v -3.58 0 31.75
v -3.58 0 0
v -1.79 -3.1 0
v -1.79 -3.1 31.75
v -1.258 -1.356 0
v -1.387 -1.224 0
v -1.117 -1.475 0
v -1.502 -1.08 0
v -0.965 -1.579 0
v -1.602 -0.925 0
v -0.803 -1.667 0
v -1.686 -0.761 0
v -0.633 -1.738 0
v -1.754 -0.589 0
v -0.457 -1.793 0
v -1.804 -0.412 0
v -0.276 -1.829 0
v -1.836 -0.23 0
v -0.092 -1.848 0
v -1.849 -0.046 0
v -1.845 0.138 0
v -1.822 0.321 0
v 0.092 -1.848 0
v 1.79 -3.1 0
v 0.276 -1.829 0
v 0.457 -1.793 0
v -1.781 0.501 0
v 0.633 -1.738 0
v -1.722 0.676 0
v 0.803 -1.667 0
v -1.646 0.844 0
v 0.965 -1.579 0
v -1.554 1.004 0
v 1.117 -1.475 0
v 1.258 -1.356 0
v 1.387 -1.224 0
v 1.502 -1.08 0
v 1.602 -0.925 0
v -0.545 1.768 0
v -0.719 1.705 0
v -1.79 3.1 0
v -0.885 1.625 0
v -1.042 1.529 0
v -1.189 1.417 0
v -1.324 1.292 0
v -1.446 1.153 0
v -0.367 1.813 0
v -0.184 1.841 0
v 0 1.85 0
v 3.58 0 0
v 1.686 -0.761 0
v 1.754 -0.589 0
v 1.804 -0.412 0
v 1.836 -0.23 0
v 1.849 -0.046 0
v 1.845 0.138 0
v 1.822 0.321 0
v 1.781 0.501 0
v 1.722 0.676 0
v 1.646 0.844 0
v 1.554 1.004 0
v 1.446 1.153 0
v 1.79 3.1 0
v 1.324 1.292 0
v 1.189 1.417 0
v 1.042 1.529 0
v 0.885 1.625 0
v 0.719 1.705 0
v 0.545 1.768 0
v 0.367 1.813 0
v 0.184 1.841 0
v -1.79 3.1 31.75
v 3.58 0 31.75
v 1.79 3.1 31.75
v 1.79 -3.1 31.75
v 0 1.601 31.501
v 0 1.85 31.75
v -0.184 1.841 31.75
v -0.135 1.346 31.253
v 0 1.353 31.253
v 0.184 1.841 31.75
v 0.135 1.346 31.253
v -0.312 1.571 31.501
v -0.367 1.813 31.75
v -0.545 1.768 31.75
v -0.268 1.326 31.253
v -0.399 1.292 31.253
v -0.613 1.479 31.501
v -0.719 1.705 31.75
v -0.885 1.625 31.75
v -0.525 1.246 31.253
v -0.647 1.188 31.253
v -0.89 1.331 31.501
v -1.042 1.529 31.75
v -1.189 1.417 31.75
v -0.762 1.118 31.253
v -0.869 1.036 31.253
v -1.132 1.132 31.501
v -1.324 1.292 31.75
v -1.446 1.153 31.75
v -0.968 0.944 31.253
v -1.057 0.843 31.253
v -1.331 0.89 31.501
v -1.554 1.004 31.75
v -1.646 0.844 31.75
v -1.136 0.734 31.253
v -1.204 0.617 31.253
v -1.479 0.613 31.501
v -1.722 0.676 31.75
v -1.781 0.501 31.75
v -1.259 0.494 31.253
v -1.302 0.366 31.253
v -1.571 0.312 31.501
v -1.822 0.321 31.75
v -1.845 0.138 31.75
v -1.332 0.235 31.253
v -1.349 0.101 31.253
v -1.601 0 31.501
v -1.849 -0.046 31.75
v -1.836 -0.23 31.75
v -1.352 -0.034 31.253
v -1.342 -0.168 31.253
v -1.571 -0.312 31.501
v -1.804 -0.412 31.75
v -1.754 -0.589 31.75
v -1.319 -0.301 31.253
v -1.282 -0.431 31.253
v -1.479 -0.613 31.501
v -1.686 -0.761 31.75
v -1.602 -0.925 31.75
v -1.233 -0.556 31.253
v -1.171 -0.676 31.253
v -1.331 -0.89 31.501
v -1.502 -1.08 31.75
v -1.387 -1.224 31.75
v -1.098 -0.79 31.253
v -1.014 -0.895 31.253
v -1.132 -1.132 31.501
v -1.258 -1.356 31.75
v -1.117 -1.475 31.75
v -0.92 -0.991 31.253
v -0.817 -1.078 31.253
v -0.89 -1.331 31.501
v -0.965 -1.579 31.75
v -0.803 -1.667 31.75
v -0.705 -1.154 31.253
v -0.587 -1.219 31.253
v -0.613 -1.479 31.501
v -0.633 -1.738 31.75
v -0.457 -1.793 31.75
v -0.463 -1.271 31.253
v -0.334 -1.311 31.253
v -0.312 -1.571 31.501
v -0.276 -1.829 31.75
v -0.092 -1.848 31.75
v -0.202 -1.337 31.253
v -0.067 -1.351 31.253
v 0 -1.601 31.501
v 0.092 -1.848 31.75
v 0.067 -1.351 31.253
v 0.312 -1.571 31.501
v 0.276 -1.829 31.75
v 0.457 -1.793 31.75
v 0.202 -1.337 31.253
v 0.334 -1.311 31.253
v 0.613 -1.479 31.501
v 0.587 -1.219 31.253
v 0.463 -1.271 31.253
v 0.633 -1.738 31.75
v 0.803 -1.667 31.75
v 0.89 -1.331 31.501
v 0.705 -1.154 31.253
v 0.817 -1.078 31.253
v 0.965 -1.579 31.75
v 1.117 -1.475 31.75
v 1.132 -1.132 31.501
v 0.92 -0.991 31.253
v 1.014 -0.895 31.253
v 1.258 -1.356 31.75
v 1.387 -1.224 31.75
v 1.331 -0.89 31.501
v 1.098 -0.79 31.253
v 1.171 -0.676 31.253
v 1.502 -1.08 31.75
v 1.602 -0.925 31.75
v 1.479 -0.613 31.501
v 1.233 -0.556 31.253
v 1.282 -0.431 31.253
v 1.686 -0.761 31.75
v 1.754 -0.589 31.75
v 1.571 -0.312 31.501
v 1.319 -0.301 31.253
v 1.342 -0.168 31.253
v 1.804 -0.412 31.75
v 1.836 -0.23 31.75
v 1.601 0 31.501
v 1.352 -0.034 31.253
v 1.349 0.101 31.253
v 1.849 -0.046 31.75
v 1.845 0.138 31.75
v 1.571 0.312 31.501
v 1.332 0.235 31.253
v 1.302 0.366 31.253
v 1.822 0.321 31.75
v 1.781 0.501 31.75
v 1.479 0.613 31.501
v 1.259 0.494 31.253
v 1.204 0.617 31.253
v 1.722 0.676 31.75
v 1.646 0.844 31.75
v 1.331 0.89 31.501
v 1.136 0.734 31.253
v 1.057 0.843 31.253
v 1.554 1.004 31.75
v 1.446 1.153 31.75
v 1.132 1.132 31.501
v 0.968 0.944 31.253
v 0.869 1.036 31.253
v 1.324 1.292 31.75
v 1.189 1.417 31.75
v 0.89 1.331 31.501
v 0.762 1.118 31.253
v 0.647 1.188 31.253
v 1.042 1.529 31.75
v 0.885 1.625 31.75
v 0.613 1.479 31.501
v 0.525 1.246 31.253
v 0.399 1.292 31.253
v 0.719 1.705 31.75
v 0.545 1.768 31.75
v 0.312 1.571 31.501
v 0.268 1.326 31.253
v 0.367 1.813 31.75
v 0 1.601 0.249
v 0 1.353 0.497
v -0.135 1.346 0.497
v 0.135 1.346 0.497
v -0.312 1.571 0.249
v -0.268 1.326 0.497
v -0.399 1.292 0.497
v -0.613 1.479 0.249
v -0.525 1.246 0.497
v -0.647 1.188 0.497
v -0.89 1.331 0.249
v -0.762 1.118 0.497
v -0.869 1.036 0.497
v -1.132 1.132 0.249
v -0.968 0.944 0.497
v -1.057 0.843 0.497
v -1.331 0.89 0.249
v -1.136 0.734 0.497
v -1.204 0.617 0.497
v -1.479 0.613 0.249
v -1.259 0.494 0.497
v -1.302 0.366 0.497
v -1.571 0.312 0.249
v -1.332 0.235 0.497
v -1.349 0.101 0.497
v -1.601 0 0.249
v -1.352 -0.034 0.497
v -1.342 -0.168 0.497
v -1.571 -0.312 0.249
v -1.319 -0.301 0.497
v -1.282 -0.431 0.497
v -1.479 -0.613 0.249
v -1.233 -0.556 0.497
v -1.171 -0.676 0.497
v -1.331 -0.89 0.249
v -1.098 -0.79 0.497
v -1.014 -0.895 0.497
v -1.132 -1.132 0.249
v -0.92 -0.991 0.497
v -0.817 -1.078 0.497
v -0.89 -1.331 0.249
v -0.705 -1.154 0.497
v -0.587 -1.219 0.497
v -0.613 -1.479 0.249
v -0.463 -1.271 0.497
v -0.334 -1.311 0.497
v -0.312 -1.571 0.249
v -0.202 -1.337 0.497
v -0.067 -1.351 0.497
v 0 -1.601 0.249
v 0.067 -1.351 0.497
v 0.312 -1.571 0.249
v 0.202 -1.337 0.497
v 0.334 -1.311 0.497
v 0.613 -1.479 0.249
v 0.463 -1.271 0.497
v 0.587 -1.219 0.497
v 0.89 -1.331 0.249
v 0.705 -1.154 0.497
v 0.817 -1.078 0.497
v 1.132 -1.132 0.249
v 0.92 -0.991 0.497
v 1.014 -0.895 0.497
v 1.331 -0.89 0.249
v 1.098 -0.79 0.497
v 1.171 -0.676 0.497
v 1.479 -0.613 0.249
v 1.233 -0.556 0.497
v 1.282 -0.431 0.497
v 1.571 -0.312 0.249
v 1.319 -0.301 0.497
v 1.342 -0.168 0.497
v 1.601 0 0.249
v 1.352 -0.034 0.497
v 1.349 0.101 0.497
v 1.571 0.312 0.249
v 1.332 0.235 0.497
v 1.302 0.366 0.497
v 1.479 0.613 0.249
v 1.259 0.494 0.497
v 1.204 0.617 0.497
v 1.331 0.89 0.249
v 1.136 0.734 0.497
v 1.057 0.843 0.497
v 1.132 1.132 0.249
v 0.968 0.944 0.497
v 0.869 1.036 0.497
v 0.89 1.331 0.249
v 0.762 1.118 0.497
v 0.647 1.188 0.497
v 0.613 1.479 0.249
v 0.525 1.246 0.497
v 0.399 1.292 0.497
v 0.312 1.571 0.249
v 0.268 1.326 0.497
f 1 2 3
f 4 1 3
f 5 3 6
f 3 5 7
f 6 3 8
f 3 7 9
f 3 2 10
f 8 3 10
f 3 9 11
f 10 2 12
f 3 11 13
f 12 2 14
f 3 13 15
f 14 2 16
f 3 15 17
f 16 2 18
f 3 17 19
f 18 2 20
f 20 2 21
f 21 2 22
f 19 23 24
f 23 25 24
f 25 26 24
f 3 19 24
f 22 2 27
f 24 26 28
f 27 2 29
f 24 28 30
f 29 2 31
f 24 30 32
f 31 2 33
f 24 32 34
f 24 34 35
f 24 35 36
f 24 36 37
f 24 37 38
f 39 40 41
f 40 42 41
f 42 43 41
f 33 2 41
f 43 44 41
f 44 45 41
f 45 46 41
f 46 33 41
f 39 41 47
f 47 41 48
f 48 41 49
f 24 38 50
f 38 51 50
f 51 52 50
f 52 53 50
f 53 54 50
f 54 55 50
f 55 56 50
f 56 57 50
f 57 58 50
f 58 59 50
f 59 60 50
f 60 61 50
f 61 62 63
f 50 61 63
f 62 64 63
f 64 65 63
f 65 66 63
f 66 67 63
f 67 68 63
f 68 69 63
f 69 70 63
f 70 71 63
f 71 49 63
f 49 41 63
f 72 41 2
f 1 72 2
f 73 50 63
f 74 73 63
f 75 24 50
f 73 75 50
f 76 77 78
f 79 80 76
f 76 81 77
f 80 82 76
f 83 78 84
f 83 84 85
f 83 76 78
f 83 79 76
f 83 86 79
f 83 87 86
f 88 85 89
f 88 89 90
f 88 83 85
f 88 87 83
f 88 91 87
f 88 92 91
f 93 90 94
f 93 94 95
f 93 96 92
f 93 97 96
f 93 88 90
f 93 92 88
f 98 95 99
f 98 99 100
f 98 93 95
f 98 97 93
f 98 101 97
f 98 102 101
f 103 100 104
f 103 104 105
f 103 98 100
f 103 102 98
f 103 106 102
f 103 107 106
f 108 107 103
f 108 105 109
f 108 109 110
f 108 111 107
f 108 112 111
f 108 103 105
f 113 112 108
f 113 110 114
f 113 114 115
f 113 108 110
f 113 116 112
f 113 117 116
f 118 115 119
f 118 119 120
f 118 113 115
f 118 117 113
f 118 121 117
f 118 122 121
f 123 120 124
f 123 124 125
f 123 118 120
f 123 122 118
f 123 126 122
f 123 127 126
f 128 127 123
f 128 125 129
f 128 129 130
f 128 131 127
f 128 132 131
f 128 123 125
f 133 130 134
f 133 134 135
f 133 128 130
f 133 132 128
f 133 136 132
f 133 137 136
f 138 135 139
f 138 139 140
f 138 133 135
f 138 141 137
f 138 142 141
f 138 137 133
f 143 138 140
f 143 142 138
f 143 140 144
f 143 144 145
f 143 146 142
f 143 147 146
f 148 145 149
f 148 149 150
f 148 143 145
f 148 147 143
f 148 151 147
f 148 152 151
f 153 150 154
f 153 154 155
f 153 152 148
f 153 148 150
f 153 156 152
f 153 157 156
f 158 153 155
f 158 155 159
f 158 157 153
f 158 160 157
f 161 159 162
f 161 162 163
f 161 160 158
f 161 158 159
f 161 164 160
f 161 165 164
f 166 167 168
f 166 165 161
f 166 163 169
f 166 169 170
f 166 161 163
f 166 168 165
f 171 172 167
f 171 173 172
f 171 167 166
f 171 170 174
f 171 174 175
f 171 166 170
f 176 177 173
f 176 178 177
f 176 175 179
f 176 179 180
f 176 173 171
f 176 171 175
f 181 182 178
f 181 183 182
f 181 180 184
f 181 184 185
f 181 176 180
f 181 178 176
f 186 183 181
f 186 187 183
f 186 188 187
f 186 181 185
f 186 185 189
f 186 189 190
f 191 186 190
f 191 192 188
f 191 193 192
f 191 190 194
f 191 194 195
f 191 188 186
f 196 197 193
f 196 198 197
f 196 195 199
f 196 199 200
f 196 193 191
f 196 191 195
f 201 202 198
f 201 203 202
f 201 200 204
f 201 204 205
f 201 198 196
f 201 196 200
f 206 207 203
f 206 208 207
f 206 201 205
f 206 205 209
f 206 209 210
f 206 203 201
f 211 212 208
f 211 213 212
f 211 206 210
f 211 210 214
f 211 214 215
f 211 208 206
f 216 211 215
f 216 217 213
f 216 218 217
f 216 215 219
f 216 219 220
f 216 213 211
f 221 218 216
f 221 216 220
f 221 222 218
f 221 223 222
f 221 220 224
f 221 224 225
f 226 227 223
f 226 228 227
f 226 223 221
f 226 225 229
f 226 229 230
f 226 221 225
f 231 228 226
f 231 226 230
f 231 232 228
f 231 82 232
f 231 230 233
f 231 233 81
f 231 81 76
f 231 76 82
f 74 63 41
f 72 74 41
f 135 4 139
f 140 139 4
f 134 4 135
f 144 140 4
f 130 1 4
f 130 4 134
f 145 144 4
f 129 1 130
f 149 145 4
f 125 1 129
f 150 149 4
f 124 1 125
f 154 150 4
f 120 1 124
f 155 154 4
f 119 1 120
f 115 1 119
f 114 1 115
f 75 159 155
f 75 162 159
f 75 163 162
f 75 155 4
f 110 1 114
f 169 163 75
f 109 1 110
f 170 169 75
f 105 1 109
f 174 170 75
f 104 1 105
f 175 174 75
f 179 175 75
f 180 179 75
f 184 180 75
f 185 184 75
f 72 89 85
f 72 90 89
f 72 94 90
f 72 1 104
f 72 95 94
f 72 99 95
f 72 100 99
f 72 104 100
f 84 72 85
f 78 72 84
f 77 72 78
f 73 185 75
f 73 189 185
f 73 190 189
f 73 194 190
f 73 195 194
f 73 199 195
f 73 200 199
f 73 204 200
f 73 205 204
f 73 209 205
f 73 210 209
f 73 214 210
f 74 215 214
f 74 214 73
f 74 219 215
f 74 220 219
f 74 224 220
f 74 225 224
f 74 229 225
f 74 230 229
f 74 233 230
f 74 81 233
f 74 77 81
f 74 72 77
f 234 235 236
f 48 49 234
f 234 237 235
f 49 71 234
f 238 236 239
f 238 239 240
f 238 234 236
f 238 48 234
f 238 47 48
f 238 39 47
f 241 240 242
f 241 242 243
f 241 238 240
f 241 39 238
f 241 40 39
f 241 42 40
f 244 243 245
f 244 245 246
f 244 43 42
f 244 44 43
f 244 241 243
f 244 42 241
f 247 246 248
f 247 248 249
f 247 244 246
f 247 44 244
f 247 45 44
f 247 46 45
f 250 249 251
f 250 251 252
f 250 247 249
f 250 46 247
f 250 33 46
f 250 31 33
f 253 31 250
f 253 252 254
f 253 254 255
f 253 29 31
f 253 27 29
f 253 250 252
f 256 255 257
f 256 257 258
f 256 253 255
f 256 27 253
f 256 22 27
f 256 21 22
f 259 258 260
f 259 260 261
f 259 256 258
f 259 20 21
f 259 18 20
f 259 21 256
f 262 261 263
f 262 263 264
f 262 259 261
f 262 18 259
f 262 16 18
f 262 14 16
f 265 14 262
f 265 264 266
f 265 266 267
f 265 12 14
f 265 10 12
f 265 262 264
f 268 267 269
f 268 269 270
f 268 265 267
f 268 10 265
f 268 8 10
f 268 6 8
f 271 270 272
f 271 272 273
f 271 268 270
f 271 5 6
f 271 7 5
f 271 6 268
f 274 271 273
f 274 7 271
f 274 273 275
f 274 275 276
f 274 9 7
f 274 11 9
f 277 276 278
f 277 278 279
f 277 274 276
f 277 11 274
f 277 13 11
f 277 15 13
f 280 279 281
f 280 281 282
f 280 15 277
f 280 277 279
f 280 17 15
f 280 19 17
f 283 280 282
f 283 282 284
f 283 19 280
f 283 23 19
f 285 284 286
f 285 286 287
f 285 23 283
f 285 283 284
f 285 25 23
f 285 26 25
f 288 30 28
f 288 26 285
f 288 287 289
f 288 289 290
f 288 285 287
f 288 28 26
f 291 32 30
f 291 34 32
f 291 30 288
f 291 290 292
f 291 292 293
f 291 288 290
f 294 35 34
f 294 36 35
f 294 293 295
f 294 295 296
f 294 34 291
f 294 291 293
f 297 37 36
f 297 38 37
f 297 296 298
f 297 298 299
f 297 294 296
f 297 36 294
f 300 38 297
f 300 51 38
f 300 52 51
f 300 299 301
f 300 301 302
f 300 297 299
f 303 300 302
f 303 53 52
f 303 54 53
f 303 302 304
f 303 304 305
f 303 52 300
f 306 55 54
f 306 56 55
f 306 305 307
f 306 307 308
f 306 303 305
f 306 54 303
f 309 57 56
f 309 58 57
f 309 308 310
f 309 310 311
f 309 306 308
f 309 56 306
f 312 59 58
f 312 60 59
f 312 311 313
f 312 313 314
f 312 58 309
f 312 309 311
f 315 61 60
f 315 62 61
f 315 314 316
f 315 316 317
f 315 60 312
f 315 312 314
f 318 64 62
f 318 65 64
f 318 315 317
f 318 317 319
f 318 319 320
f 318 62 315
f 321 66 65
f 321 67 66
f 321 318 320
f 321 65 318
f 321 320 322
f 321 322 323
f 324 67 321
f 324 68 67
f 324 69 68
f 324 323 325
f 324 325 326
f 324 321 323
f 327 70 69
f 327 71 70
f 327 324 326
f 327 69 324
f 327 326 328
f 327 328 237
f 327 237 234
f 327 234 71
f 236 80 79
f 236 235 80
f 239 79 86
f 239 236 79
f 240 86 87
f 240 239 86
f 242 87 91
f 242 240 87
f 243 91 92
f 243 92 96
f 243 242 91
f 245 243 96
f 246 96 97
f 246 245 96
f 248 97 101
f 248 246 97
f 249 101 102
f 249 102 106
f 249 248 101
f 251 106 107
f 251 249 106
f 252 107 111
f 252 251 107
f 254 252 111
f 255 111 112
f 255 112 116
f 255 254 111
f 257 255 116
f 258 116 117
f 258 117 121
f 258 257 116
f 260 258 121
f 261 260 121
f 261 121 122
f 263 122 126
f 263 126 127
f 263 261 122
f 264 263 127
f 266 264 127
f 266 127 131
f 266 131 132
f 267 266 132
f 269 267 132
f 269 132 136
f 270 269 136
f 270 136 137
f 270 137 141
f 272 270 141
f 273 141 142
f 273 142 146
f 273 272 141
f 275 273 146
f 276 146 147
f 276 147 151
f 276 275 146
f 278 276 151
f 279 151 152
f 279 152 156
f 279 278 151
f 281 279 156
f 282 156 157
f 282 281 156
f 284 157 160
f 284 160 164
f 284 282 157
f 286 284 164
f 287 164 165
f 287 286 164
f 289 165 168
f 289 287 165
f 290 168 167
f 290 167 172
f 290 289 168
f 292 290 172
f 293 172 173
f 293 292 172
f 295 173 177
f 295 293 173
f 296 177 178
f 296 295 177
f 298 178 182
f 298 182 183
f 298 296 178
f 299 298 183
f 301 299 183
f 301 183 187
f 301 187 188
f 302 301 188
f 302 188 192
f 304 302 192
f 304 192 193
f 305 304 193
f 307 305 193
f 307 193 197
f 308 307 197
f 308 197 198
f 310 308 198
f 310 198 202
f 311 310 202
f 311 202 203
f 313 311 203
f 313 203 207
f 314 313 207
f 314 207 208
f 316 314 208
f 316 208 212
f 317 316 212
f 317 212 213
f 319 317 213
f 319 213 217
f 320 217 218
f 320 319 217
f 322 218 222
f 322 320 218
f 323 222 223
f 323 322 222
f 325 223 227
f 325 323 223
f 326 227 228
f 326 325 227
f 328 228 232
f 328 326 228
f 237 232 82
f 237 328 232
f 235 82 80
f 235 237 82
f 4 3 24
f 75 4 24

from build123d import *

# Parameters (mm, degrees)
BOSS_EXTRUDE1_DEPTH = 31.75


with BuildPart() as part:
    # Sketch1 → Boss-Extrude1 (new body)
    with BuildSketch(Plane.XY):
        Polygon((-3.579571669, 0), (-1.789785834, -3.1), (1.789785834, -3.1), (3.579571669, 0), (1.789785834, 3.1), (-1.789785834, 3.1), align=None)
    extrude(amount=BOSS_EXTRUDE1_DEPTH)

    # Sketch3 → #6-32 Tapped Hole1 (revolve, cut)
    with BuildSketch(Plane.YZ):
        Polygon((0, 0), (0, 31.75), (1.849999983, 31.75), (1.35255, 31.252550017), (1.35255, 0.497449983), (1.849999983, 0), align=None)
    revolve(axis=Axis((0, 0, -6.35), (0, 0, 1)), mode=Mode.SUBTRACT)


solid = part.part
